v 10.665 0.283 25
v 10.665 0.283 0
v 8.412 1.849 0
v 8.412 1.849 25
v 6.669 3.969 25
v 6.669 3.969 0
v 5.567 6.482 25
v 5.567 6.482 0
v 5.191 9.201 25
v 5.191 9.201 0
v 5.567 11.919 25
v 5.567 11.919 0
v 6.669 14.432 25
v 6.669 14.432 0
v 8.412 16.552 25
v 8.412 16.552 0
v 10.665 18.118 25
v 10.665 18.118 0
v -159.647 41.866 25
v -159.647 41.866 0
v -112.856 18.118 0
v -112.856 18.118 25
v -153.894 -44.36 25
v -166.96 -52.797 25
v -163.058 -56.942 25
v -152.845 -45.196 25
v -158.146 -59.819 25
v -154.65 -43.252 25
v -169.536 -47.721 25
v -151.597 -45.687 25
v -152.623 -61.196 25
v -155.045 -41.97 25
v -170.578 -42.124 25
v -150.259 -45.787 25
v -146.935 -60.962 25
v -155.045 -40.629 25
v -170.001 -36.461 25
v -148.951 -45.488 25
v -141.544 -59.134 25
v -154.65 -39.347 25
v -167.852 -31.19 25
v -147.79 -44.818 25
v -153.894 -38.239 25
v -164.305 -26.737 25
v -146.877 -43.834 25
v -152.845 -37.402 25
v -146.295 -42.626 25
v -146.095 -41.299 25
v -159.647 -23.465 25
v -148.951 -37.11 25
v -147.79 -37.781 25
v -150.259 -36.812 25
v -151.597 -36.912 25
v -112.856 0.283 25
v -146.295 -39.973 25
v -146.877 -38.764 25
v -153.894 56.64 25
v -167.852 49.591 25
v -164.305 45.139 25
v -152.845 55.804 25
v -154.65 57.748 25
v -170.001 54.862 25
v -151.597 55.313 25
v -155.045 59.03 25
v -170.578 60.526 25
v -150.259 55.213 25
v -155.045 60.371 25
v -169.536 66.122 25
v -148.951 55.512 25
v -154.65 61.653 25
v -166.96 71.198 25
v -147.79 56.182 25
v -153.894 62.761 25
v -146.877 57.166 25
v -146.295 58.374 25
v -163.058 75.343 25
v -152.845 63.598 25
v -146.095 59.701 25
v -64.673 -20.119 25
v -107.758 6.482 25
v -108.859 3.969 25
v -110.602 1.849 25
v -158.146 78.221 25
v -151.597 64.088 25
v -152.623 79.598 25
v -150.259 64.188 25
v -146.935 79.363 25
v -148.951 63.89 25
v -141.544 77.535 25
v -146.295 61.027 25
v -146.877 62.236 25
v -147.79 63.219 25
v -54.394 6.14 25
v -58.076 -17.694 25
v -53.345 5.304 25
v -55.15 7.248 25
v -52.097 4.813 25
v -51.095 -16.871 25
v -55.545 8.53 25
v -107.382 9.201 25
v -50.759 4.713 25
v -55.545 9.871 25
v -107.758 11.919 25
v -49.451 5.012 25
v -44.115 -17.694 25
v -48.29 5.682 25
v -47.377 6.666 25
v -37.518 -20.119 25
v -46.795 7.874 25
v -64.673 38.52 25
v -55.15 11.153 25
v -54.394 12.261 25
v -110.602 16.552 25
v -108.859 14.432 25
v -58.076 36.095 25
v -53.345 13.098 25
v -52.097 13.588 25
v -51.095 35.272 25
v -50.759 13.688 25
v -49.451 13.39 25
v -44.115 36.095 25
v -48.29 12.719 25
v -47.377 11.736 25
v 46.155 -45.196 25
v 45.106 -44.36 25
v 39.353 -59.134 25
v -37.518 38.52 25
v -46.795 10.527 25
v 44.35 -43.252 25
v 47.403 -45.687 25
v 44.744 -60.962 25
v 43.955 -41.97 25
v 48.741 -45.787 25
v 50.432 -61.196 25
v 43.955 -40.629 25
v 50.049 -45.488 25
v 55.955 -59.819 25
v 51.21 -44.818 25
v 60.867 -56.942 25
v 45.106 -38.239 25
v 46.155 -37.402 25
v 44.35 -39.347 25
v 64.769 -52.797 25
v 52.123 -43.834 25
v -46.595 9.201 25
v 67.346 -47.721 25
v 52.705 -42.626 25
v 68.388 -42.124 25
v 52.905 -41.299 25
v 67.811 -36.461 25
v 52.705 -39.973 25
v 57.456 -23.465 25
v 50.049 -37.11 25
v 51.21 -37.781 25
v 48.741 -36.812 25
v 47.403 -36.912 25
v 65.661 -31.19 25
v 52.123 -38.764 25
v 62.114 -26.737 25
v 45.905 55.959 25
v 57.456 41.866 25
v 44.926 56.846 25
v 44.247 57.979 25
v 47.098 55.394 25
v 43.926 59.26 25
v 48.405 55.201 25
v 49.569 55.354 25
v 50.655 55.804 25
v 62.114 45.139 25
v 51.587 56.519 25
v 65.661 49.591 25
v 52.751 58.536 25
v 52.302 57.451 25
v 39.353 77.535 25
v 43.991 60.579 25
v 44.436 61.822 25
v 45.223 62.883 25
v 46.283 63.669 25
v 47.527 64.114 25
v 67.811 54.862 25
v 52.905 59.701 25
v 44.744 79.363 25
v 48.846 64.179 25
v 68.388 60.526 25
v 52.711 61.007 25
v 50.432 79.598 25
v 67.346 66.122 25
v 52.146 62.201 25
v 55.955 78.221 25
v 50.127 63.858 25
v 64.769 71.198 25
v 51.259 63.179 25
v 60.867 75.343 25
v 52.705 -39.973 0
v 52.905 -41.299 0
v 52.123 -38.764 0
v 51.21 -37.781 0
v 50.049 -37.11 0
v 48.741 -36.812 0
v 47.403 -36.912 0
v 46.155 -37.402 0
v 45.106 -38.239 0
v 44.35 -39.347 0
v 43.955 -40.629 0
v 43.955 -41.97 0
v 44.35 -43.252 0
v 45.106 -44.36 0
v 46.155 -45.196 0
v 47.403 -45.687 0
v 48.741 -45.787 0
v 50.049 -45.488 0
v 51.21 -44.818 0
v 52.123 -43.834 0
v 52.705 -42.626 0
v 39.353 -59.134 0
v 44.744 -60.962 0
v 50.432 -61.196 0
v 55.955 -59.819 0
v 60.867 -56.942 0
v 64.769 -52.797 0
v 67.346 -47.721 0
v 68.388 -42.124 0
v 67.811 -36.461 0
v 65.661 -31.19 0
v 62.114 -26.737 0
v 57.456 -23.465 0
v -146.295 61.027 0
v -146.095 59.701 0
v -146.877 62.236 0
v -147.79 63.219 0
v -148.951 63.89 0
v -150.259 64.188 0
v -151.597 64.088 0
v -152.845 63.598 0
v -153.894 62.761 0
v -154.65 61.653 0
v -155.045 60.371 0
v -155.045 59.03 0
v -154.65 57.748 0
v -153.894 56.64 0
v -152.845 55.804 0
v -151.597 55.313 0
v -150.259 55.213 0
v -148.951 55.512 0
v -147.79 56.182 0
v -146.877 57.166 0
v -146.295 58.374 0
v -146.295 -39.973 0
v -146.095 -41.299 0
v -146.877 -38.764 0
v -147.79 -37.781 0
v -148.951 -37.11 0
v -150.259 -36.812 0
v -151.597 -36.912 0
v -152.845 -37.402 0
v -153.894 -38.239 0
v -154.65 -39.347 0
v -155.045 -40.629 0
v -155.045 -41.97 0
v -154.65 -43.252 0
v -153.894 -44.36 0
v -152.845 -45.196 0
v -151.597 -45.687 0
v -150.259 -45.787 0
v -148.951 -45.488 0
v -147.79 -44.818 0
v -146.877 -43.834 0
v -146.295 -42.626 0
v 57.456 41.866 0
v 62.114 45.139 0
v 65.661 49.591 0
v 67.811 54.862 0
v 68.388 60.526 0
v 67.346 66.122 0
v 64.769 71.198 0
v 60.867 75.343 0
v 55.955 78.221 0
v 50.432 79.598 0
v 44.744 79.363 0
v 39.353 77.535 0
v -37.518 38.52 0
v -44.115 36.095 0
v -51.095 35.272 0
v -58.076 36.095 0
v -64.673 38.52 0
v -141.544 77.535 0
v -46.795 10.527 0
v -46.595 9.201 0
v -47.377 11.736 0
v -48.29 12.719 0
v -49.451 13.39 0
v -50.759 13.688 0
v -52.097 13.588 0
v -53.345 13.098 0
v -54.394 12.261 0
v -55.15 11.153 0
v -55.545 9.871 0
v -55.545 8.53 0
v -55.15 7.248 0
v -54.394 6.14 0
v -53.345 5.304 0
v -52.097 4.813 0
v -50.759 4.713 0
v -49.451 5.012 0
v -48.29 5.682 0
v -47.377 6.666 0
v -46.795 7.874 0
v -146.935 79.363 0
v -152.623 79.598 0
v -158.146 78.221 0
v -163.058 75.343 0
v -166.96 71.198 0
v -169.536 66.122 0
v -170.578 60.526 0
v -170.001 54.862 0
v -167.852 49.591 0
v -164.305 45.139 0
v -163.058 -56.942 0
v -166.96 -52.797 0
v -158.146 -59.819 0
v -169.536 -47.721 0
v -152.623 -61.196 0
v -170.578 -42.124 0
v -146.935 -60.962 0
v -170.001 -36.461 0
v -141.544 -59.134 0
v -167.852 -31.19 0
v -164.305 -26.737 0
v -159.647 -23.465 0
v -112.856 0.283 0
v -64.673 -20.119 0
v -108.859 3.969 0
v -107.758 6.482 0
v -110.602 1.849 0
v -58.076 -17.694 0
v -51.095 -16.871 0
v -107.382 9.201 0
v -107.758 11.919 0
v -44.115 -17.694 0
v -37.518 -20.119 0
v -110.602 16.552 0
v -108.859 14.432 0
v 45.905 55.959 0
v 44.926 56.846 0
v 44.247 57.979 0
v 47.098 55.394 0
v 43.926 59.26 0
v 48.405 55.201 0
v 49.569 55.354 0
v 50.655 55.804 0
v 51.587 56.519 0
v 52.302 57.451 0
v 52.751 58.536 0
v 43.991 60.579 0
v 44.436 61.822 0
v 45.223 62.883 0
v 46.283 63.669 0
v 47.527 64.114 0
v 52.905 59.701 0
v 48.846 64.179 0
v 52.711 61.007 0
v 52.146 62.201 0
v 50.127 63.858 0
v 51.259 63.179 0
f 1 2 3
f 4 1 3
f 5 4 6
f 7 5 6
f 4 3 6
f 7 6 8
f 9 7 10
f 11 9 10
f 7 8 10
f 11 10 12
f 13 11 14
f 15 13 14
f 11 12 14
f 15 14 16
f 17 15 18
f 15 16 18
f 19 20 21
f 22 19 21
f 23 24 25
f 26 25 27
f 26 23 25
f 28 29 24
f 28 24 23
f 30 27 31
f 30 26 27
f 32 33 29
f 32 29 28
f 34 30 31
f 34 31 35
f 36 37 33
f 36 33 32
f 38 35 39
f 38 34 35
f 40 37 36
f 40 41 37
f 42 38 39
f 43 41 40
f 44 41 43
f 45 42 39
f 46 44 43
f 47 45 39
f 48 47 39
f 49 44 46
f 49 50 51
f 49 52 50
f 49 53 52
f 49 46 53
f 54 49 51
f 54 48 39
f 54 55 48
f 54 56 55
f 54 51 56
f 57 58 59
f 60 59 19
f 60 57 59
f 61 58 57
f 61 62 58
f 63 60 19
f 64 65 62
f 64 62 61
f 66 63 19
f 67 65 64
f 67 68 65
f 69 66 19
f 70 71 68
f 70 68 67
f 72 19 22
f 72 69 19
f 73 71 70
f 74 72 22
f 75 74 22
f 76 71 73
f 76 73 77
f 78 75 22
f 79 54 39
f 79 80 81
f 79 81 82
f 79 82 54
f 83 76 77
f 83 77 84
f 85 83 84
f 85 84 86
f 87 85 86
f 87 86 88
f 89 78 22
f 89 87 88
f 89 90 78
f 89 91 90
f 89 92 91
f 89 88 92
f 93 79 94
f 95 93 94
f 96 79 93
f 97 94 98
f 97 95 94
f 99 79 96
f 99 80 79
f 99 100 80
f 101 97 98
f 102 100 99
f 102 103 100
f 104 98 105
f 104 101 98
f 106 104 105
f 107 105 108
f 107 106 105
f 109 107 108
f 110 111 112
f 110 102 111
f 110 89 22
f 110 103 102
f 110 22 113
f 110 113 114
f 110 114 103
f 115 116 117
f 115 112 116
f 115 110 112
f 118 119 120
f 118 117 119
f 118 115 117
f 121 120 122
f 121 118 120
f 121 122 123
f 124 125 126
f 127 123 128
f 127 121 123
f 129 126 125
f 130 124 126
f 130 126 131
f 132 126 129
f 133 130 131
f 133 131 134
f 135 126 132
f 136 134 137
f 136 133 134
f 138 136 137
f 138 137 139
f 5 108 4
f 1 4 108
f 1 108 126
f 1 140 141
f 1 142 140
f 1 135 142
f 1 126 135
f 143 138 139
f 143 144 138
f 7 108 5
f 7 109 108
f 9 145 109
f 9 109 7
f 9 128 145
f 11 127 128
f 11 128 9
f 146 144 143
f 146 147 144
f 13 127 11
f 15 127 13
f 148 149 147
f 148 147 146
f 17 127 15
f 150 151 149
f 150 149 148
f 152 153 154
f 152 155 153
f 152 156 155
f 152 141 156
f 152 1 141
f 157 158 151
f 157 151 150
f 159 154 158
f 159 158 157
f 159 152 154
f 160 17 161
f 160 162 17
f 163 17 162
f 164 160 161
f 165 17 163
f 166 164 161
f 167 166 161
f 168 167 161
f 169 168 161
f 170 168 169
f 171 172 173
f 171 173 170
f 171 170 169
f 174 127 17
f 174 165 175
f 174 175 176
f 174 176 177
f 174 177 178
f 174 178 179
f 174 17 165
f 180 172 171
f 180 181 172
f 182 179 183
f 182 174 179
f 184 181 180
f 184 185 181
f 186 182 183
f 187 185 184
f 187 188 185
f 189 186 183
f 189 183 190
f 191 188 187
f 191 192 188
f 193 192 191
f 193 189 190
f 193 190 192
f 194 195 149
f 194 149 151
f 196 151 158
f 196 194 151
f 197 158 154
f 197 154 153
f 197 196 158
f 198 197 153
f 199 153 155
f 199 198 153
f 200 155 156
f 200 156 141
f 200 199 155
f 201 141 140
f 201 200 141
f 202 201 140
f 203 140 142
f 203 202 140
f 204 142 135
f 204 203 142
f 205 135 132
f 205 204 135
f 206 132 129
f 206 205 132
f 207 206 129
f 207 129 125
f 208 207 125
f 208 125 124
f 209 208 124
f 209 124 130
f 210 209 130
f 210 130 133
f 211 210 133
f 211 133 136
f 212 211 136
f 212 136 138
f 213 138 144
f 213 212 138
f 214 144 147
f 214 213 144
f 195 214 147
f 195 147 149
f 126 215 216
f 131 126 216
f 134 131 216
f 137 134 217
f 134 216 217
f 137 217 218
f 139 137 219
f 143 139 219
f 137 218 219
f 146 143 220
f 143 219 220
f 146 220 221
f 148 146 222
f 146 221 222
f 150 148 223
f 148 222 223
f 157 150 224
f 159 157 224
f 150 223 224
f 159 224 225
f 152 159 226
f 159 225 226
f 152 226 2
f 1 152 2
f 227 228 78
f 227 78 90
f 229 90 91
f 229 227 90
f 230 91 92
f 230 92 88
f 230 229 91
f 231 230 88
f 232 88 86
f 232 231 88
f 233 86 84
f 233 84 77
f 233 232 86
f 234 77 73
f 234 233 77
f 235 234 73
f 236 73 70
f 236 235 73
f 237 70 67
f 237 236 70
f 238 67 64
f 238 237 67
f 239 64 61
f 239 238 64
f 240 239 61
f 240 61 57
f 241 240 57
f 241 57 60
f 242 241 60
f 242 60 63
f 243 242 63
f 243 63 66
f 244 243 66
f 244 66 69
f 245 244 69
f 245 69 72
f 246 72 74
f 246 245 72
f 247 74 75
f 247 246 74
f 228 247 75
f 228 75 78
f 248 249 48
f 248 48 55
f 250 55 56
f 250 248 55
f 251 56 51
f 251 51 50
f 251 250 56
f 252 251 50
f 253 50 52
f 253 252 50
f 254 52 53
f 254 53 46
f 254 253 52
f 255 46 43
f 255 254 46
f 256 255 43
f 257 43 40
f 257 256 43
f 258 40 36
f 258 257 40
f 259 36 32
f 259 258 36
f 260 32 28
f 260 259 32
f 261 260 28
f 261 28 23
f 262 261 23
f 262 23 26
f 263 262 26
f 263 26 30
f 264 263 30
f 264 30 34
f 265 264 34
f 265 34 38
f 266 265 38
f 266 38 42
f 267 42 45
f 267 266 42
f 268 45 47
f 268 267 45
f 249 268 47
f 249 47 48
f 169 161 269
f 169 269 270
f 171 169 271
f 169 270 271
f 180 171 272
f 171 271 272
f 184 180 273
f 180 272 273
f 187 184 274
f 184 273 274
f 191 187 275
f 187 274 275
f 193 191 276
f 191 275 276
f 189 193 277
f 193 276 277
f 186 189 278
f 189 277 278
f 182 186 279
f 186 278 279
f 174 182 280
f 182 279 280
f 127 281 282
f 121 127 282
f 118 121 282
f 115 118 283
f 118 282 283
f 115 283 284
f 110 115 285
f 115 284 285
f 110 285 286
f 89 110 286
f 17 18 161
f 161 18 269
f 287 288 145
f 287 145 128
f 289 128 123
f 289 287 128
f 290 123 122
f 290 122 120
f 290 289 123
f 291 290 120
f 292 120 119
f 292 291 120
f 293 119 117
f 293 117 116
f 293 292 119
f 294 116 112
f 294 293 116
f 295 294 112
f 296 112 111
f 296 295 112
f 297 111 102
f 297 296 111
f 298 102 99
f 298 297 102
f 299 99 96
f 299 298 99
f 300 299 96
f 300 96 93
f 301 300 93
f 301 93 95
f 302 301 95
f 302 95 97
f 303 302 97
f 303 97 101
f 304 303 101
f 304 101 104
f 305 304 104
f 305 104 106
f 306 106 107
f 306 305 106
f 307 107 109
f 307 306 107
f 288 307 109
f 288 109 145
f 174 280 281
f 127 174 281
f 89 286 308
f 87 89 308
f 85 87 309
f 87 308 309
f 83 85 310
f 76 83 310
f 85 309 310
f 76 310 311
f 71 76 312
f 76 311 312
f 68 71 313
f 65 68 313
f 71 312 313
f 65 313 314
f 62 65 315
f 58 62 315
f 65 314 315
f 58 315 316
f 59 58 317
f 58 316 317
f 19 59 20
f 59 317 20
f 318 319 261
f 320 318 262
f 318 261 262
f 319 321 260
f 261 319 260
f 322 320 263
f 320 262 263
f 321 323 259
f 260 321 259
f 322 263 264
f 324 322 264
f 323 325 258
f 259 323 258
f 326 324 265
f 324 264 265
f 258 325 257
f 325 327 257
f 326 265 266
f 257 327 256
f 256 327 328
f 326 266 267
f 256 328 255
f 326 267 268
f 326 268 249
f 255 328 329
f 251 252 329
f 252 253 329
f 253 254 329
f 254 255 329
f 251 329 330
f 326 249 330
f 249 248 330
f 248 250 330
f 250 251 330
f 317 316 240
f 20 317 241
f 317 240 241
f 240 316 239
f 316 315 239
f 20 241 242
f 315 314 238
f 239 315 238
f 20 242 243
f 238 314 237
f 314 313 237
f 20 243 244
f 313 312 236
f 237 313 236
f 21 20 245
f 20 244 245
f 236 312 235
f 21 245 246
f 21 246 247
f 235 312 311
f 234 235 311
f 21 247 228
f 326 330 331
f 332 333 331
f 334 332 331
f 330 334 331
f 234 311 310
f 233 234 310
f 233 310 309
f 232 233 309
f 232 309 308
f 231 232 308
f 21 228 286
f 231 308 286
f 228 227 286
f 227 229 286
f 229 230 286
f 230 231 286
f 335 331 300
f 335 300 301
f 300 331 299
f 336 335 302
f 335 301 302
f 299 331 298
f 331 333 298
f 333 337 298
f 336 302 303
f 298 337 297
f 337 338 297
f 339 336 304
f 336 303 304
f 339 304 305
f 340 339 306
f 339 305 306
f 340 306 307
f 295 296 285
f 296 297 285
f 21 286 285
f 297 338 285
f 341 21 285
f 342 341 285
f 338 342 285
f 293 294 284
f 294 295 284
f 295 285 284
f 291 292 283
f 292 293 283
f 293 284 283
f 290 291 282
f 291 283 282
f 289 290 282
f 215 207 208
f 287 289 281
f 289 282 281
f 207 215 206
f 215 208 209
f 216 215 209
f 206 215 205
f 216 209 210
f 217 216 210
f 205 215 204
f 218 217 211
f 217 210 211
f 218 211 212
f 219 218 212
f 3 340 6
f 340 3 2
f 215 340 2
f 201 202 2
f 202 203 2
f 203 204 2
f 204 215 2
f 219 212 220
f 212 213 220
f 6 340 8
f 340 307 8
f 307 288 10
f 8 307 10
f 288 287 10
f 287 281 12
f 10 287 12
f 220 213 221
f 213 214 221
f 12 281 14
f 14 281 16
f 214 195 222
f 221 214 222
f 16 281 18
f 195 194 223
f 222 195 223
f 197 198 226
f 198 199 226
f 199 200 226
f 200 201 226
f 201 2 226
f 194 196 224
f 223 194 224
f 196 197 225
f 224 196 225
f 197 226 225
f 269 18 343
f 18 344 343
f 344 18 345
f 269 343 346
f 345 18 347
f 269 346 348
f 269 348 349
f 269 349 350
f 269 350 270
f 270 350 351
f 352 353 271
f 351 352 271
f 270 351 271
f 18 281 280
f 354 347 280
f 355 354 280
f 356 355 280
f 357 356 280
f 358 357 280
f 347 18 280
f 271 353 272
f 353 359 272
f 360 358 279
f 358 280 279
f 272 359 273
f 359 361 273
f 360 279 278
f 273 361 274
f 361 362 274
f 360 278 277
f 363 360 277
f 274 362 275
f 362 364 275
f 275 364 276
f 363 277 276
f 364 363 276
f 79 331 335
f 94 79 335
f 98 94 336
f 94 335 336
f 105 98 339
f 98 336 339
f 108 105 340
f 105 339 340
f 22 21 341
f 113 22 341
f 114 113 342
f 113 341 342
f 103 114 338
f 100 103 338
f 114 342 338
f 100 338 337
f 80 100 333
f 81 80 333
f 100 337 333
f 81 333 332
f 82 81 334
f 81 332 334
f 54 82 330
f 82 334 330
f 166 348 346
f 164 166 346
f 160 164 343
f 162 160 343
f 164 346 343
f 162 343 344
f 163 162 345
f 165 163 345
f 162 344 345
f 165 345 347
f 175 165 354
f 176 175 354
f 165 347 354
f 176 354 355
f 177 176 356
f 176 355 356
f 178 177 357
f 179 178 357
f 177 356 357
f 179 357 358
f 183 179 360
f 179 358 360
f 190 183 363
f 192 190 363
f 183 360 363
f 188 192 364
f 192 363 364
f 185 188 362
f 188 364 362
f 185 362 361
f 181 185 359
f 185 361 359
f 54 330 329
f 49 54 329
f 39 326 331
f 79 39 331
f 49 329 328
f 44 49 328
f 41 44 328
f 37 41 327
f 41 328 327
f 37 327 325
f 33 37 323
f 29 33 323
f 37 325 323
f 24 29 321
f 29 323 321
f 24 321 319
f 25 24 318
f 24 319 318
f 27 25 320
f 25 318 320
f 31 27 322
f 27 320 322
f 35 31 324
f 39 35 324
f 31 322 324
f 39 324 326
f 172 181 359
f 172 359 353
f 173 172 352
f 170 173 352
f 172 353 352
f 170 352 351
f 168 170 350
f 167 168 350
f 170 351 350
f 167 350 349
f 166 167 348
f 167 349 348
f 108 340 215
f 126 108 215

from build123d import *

# Parameters (mm, degrees)
F0_R     = 4.5
F1_DEPTH = 25


with BuildPart() as f1:
    # F0 (on Top) → F1 (new body)
    with BuildSketch(Plane.XY):
        with BuildLine():
            ThreePointArc((48.404608, 55.200653), (51.586588, 56.518673), (52.904608, 59.700653))
            ThreePointArc((52.904608, 59.700653), (45.222627, 62.882634), (48.404608, 55.200653))
        make_face()
        with BuildLine():
            Line((-112.855788, 0.283429), (-159.647047, -23.464898))
            ThreePointArc((-159.647047, -23.464898), (-168.42984, -50.351002), (-141.543737, -59.133795))
            Line((-141.543737, -59.133795), (-64.672874, -20.118935))
            ThreePointArc((-64.672874, -20.118935), (-51.095392, -16.870607), (-37.51791, -20.118935))
            Line((-37.51791, -20.118935), (39.352953, -59.133795))
            ThreePointArc((39.352953, -59.133795), (66.239056, -50.351002), (57.456263, -23.464898))
            Line((57.456263, -23.464898), (10.665003, 0.283429))
            ThreePointArc((10.665003, 0.283429), (5.190831, 9.200653), (10.665003, 18.117877))
            Line((10.665003, 18.117877), (57.456263, 41.866205))
            ThreePointArc((57.456263, 41.866205), (66.239056, 68.752308), (39.352953, 77.535102))
            Line((39.352953, 77.535102), (-37.51791, 38.520241))
            ThreePointArc((-37.51791, 38.520241), (-51.095392, 35.271914), (-64.672874, 38.520241))
            Line((-64.672874, 38.520241), (-141.543737, 77.535102))
            ThreePointArc((-141.543737, 77.535102), (-168.42984, 68.752308), (-159.647047, 41.866205))
            Line((-159.647047, 41.866205), (-112.855788, 18.117877))
            ThreePointArc((-112.855788, 18.117877), (-107.381615, 9.200653), (-112.855788, 0.283429))
        make_face()
        with Locations((-150.595392, -41.299347)):
            Circle(F0_R, mode=Mode.SUBTRACT)
        with Locations((48.404608, -41.299347)):
            Circle(F0_R, mode=Mode.SUBTRACT)
        with Locations((-51.095392, 9.200653)):
            Circle(F0_R, mode=Mode.SUBTRACT)
        with Locations((-150.595392, 59.700653)):
            Circle(F0_R, mode=Mode.SUBTRACT)
        with BuildLine():
            ThreePointArc((48.404608, 55.200653), (45.222627, 62.882634), (52.904608, 59.700653))
            ThreePointArc((52.904608, 59.700653), (51.586588, 56.518673), (48.404608, 55.200653))
        make_face(mode=Mode.SUBTRACT)
    extrude(amount=F1_DEPTH)


solid = f1.part
